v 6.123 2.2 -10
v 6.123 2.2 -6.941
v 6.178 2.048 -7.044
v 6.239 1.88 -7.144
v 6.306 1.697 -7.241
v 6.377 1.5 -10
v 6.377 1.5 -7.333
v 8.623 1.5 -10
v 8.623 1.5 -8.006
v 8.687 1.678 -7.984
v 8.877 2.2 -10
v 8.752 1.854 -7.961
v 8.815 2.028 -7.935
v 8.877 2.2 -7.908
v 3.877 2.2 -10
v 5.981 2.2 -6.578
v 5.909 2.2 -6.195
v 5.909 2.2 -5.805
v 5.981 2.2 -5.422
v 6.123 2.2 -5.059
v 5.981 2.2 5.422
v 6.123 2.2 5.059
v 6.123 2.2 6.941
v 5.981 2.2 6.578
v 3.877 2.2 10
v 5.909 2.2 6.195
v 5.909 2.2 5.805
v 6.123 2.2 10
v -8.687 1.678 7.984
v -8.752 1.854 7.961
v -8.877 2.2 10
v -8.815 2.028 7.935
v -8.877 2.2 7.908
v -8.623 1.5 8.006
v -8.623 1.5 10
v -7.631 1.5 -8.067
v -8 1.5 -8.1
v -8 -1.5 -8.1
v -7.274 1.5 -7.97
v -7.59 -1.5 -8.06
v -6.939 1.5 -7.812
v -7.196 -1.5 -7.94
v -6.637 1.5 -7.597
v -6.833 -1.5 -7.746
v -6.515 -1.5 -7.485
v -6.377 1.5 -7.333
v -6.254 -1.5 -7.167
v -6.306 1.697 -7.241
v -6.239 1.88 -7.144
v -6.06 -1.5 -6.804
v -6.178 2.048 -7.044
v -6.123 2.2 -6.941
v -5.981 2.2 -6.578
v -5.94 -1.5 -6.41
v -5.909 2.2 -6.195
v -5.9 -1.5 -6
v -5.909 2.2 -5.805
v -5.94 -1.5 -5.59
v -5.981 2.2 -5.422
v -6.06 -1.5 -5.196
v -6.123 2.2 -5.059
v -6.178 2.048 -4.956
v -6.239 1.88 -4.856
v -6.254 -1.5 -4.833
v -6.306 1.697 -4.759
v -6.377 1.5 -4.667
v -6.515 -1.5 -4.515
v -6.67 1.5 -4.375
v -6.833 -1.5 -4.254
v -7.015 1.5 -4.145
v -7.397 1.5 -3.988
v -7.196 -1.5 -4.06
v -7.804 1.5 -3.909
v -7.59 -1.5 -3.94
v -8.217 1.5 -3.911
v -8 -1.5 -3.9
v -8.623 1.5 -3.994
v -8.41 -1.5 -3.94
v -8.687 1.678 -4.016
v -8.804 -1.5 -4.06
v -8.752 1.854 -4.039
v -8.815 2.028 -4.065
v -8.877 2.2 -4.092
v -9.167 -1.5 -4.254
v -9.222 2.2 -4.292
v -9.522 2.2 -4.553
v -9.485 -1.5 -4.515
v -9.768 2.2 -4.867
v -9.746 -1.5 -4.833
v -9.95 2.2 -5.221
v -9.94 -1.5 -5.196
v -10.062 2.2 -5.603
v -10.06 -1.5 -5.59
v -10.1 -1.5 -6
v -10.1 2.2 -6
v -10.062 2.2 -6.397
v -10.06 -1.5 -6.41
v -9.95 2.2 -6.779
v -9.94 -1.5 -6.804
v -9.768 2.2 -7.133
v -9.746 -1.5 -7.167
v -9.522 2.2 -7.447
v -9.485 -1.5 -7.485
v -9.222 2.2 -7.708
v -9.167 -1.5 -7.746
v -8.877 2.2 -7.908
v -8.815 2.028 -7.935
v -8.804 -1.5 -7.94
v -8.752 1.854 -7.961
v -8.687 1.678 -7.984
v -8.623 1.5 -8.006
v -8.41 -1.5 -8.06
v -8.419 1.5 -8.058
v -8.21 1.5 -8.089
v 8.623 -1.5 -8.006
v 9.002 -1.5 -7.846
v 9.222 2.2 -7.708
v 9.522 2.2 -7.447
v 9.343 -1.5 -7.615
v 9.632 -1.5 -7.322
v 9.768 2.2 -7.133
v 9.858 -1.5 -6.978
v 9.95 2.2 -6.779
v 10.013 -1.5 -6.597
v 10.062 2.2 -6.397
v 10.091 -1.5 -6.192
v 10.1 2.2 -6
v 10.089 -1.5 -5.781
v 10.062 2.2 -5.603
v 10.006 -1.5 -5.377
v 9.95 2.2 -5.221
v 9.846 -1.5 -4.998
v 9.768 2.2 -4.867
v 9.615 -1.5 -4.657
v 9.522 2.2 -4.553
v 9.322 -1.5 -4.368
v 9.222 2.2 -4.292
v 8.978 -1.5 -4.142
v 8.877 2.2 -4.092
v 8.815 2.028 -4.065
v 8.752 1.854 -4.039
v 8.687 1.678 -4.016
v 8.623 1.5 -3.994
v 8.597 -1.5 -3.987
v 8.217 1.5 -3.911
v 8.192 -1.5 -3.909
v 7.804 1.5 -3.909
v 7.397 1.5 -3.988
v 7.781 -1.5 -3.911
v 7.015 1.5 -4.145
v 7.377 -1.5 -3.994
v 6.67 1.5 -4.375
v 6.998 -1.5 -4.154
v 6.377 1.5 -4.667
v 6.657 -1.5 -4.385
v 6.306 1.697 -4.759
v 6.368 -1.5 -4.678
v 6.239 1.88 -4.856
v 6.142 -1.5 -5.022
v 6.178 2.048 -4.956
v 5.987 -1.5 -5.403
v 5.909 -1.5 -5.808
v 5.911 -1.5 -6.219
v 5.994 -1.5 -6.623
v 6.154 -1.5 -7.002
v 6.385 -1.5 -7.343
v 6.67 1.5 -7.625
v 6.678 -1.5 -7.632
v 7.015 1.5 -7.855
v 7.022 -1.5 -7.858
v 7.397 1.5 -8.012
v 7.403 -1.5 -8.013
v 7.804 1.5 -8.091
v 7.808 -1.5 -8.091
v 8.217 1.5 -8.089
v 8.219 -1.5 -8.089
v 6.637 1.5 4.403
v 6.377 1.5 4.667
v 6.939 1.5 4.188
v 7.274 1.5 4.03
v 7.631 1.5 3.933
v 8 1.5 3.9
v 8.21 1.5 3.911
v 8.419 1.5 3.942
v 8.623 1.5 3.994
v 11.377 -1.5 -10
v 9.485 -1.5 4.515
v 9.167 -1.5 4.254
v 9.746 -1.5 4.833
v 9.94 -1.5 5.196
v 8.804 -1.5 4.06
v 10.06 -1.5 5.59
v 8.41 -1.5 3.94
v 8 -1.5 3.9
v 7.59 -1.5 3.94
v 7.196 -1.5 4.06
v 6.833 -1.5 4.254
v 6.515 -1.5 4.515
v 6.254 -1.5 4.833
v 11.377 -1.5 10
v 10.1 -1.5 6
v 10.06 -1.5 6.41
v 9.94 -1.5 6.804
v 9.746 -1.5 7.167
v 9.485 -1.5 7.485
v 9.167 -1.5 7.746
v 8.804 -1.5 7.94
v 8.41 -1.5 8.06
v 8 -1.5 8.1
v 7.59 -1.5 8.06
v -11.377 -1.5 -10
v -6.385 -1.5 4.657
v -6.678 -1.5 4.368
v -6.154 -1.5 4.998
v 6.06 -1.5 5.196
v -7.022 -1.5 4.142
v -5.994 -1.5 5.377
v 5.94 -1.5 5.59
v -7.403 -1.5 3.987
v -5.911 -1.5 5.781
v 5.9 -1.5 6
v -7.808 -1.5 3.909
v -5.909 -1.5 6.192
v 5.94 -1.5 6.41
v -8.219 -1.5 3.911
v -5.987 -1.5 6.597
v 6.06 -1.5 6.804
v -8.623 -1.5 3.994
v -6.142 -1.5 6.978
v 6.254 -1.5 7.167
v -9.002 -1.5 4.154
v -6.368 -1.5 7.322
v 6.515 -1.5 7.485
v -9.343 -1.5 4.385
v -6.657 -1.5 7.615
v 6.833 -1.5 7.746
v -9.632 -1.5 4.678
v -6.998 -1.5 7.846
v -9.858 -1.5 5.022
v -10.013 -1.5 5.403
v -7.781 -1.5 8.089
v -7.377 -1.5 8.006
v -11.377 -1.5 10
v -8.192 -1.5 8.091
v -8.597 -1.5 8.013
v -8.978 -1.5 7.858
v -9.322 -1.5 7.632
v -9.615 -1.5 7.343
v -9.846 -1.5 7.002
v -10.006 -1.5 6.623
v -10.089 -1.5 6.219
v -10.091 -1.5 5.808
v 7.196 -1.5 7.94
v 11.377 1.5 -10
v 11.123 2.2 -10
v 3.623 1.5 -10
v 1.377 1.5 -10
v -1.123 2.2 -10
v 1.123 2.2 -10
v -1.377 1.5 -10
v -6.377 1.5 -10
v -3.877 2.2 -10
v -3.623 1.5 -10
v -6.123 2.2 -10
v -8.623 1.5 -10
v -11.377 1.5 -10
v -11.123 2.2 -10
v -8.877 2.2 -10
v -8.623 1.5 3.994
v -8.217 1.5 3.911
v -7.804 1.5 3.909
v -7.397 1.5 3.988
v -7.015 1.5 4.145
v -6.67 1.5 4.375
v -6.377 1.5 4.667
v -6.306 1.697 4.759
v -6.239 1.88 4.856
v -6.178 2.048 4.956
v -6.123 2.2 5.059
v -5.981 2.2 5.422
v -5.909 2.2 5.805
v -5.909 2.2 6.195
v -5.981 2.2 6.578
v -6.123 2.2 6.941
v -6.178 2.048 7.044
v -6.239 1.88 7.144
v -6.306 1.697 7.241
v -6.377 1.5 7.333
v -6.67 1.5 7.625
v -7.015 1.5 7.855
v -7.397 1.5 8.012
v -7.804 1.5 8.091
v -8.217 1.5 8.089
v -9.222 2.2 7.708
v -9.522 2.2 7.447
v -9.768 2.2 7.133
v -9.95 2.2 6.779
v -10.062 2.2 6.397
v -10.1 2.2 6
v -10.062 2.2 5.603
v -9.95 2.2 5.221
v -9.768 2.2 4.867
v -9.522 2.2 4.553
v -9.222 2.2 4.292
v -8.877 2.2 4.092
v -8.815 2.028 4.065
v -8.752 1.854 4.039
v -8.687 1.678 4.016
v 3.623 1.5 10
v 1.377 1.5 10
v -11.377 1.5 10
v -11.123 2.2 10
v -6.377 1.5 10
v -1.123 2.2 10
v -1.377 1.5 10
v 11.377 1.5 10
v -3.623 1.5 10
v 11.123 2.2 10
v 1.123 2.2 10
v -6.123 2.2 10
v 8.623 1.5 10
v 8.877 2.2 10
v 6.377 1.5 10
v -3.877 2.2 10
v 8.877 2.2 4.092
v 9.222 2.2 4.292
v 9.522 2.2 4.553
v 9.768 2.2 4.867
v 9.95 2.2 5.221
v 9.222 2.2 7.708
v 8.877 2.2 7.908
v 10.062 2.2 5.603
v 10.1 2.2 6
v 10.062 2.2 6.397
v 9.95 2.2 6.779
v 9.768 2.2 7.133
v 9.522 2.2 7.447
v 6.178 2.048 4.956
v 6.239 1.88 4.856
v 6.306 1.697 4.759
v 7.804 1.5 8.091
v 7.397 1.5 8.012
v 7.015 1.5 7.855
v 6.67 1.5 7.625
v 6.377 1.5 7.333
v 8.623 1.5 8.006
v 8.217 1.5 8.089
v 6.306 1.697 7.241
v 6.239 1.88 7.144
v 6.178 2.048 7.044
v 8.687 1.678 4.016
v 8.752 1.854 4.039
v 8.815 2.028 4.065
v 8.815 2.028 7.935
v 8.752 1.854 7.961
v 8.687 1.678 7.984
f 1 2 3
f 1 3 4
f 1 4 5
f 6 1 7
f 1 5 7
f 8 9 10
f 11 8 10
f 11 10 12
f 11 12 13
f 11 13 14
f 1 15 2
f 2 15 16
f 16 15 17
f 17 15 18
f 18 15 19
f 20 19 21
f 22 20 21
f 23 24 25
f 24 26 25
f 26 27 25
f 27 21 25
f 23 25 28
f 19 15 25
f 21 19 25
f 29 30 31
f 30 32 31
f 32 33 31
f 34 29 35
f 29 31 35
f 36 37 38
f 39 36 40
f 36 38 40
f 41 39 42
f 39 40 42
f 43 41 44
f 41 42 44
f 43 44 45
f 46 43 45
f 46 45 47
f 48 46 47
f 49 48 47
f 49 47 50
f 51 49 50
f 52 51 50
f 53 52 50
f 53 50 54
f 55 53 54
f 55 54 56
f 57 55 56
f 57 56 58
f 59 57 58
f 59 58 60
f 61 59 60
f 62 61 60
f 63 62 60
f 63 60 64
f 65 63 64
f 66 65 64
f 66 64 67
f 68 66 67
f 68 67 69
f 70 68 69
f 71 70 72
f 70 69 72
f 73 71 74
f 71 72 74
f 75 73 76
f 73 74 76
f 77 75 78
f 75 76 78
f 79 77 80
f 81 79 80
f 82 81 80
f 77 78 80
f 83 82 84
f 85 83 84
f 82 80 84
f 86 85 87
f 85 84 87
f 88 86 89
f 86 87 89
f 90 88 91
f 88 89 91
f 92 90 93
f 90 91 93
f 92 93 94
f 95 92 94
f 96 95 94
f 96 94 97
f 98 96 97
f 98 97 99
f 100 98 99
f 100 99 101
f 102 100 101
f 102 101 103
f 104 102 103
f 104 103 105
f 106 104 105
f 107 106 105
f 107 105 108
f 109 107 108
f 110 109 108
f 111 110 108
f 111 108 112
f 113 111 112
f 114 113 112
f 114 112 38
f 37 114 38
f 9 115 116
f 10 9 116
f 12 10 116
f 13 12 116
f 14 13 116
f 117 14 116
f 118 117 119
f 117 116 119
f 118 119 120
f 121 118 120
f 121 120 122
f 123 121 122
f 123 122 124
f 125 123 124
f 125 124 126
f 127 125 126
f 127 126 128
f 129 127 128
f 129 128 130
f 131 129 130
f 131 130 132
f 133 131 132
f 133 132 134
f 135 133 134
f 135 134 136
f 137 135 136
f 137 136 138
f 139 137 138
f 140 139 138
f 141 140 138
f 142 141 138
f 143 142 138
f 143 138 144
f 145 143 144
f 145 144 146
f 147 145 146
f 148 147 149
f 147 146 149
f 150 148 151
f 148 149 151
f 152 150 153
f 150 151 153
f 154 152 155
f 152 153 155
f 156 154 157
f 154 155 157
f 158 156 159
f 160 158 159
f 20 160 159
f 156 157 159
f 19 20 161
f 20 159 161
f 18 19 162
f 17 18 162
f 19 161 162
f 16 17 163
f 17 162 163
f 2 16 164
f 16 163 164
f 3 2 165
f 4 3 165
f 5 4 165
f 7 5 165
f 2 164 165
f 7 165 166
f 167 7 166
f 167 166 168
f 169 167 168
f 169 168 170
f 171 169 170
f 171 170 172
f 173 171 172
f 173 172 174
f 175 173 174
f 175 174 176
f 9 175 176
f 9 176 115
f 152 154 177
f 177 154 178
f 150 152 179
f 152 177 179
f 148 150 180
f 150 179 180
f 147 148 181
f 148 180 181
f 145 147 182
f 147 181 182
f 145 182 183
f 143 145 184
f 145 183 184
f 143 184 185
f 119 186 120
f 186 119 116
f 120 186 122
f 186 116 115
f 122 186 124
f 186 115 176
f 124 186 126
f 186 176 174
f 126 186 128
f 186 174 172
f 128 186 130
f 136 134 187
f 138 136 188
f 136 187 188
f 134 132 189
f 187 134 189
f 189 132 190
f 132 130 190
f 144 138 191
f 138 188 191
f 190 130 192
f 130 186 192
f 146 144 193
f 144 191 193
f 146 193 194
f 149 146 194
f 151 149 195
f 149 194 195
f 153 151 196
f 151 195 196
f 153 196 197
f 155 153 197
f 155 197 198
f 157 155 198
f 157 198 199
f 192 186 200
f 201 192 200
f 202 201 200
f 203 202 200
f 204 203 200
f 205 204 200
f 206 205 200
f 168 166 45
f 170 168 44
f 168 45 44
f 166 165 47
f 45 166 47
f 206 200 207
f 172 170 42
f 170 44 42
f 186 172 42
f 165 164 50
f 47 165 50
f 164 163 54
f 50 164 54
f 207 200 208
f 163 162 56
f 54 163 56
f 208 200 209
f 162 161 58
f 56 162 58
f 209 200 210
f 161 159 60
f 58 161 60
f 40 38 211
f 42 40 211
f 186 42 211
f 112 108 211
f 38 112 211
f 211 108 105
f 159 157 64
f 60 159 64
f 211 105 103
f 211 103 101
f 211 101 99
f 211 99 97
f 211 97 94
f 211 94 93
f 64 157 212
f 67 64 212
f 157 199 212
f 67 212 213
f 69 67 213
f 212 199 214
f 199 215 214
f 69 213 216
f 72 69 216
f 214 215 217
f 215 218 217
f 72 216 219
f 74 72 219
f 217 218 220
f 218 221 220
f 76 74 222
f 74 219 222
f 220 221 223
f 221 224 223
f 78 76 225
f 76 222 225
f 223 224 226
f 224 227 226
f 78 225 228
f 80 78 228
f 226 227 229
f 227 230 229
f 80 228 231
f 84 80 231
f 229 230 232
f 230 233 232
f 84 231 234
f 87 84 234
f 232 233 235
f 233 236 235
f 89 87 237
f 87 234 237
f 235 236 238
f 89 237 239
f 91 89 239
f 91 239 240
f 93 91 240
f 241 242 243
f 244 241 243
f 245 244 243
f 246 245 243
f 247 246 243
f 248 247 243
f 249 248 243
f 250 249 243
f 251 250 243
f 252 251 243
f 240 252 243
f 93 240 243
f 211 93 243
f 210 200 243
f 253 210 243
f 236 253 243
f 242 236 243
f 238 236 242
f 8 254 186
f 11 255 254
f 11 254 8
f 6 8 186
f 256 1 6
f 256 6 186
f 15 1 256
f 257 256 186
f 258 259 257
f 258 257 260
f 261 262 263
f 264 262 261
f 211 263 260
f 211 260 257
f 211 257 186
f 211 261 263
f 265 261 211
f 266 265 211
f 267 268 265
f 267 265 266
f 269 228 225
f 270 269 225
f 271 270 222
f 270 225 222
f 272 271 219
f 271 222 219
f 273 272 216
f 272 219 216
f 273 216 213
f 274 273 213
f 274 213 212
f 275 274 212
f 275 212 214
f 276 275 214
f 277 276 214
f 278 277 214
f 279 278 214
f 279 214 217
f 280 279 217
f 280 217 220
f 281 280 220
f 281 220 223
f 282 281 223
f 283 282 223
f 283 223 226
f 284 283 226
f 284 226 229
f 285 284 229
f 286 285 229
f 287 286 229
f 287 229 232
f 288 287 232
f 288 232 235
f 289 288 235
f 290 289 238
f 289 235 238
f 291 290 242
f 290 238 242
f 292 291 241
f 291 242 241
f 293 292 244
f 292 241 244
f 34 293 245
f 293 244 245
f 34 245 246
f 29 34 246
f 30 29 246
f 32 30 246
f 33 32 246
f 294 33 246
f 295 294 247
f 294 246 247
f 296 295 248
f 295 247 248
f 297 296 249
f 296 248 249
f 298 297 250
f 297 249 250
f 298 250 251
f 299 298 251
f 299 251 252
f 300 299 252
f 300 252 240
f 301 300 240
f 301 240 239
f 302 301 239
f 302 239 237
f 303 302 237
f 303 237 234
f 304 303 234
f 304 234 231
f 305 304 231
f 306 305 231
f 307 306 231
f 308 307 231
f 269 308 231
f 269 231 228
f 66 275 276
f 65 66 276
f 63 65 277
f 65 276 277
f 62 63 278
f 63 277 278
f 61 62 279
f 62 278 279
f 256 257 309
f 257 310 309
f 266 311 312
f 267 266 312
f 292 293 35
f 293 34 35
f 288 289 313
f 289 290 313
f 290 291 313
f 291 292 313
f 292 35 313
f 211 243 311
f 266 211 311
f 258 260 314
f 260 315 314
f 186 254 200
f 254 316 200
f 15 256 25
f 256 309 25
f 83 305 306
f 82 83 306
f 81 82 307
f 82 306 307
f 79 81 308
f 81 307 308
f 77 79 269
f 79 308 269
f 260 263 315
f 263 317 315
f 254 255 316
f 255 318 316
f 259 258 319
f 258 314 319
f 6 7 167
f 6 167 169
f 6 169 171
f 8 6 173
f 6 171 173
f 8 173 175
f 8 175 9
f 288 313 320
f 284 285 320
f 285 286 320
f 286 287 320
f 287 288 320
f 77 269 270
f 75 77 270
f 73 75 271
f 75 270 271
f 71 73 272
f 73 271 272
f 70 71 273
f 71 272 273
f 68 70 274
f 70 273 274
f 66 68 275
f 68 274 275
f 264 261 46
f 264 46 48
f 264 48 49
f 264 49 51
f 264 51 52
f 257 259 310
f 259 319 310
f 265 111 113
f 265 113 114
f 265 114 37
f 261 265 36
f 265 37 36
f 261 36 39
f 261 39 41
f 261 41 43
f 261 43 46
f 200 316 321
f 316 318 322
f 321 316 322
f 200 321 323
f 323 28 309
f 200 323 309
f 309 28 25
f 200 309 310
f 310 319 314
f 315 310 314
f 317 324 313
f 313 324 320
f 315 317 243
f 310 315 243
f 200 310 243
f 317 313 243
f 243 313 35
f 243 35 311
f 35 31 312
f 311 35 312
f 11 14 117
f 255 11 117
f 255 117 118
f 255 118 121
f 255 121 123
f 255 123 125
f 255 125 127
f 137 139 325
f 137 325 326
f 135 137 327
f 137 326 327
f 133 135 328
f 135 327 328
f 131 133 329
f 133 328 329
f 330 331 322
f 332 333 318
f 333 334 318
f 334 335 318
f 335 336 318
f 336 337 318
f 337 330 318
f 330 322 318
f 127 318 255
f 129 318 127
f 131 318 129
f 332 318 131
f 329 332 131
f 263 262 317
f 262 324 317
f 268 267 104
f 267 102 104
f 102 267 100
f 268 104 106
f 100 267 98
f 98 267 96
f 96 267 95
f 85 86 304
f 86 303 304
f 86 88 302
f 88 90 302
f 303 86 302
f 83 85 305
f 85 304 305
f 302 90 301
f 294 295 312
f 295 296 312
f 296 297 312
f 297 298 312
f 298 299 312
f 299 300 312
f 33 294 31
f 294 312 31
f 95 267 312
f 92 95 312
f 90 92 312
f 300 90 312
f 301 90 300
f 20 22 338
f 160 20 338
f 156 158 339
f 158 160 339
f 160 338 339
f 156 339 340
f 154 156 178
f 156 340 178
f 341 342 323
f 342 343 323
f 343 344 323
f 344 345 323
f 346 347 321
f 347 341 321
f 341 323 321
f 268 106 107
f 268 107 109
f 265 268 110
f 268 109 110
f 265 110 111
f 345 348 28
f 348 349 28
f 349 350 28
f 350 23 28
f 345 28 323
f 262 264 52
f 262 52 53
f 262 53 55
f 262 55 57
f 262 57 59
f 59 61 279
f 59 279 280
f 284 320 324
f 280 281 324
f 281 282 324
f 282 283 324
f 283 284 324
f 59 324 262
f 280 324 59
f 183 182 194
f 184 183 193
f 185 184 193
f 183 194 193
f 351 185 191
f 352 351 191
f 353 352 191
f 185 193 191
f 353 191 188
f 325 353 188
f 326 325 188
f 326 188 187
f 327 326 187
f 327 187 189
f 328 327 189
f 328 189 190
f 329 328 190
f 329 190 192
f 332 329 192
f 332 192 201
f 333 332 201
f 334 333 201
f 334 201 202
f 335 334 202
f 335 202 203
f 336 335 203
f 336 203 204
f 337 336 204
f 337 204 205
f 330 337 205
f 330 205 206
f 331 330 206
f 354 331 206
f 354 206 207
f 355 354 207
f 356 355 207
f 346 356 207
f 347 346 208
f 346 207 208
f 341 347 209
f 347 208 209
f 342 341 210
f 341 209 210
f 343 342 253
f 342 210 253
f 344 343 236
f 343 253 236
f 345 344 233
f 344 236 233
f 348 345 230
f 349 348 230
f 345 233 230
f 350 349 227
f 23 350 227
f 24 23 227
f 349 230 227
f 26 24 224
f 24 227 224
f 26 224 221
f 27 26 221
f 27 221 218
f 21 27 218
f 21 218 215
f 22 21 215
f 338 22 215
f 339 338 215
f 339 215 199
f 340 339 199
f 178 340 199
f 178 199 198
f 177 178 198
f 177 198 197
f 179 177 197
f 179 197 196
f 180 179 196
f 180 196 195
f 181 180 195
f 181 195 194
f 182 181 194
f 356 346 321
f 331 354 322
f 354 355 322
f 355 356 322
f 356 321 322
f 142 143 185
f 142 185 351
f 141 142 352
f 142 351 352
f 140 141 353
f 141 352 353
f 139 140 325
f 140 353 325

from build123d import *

# Parameters (mm, degrees)
BOSS_EXTRUDE1_DEPTH = 10
SKETCH2_R           = 2.1
CUT_EXTRUDE1_DEPTH  = 16.592786592


with BuildPart() as part:
    # Sketch1 → Boss-Extrude1 (new, symmetric)
    with BuildSketch(Plane.XY):
        Polygon((-11.377389582, 1.5), (-11.122610418, 2.2), (-8.877389582, 2.2), (-8.622610418, 1.5), (-6.377389582, 1.5), (-6.122610418, 2.2), (-3.877389582, 2.2), (-3.622610418, 1.5), (-1.377389582, 1.5), (-1.122610418, 2.2), (1.122610418, 2.2), (1.377389582, 1.5), (3.622610418, 1.5), (3.877389582, 2.2), (6.122610418, 2.2), (6.377389582, 1.5), (8.622610418, 1.5), (8.877389582, 2.2), (11.122610418, 2.2), (11.377389582, 1.5), (11.377389582, -1.5), (-11.377389582, -1.5), align=None)
    extrude(amount=BOSS_EXTRUDE1_DEPTH, both=True)

    # Sketch2 → Cut-Extrude1 (cut, through all)
    with BuildSketch(Plane.XZ.offset(1.5)):
        with Locations(Location((-8, -6, 0), (0, 0, 270))):
            Circle(SKETCH2_R)
        with Locations(Location((8, -6, 0), (0, 0, 287.246374966))):
            Circle(SKETCH2_R)
        with Locations(Location((8, 6, 0), (0, 0, 270))):
            Circle(SKETCH2_R)
        with Locations(Location((-8, 6, 0), (0, 0, 252.753625034))):
            Circle(SKETCH2_R)
    extrude(amount=-CUT_EXTRUDE1_DEPTH, mode=Mode.SUBTRACT)


solid = part.part
